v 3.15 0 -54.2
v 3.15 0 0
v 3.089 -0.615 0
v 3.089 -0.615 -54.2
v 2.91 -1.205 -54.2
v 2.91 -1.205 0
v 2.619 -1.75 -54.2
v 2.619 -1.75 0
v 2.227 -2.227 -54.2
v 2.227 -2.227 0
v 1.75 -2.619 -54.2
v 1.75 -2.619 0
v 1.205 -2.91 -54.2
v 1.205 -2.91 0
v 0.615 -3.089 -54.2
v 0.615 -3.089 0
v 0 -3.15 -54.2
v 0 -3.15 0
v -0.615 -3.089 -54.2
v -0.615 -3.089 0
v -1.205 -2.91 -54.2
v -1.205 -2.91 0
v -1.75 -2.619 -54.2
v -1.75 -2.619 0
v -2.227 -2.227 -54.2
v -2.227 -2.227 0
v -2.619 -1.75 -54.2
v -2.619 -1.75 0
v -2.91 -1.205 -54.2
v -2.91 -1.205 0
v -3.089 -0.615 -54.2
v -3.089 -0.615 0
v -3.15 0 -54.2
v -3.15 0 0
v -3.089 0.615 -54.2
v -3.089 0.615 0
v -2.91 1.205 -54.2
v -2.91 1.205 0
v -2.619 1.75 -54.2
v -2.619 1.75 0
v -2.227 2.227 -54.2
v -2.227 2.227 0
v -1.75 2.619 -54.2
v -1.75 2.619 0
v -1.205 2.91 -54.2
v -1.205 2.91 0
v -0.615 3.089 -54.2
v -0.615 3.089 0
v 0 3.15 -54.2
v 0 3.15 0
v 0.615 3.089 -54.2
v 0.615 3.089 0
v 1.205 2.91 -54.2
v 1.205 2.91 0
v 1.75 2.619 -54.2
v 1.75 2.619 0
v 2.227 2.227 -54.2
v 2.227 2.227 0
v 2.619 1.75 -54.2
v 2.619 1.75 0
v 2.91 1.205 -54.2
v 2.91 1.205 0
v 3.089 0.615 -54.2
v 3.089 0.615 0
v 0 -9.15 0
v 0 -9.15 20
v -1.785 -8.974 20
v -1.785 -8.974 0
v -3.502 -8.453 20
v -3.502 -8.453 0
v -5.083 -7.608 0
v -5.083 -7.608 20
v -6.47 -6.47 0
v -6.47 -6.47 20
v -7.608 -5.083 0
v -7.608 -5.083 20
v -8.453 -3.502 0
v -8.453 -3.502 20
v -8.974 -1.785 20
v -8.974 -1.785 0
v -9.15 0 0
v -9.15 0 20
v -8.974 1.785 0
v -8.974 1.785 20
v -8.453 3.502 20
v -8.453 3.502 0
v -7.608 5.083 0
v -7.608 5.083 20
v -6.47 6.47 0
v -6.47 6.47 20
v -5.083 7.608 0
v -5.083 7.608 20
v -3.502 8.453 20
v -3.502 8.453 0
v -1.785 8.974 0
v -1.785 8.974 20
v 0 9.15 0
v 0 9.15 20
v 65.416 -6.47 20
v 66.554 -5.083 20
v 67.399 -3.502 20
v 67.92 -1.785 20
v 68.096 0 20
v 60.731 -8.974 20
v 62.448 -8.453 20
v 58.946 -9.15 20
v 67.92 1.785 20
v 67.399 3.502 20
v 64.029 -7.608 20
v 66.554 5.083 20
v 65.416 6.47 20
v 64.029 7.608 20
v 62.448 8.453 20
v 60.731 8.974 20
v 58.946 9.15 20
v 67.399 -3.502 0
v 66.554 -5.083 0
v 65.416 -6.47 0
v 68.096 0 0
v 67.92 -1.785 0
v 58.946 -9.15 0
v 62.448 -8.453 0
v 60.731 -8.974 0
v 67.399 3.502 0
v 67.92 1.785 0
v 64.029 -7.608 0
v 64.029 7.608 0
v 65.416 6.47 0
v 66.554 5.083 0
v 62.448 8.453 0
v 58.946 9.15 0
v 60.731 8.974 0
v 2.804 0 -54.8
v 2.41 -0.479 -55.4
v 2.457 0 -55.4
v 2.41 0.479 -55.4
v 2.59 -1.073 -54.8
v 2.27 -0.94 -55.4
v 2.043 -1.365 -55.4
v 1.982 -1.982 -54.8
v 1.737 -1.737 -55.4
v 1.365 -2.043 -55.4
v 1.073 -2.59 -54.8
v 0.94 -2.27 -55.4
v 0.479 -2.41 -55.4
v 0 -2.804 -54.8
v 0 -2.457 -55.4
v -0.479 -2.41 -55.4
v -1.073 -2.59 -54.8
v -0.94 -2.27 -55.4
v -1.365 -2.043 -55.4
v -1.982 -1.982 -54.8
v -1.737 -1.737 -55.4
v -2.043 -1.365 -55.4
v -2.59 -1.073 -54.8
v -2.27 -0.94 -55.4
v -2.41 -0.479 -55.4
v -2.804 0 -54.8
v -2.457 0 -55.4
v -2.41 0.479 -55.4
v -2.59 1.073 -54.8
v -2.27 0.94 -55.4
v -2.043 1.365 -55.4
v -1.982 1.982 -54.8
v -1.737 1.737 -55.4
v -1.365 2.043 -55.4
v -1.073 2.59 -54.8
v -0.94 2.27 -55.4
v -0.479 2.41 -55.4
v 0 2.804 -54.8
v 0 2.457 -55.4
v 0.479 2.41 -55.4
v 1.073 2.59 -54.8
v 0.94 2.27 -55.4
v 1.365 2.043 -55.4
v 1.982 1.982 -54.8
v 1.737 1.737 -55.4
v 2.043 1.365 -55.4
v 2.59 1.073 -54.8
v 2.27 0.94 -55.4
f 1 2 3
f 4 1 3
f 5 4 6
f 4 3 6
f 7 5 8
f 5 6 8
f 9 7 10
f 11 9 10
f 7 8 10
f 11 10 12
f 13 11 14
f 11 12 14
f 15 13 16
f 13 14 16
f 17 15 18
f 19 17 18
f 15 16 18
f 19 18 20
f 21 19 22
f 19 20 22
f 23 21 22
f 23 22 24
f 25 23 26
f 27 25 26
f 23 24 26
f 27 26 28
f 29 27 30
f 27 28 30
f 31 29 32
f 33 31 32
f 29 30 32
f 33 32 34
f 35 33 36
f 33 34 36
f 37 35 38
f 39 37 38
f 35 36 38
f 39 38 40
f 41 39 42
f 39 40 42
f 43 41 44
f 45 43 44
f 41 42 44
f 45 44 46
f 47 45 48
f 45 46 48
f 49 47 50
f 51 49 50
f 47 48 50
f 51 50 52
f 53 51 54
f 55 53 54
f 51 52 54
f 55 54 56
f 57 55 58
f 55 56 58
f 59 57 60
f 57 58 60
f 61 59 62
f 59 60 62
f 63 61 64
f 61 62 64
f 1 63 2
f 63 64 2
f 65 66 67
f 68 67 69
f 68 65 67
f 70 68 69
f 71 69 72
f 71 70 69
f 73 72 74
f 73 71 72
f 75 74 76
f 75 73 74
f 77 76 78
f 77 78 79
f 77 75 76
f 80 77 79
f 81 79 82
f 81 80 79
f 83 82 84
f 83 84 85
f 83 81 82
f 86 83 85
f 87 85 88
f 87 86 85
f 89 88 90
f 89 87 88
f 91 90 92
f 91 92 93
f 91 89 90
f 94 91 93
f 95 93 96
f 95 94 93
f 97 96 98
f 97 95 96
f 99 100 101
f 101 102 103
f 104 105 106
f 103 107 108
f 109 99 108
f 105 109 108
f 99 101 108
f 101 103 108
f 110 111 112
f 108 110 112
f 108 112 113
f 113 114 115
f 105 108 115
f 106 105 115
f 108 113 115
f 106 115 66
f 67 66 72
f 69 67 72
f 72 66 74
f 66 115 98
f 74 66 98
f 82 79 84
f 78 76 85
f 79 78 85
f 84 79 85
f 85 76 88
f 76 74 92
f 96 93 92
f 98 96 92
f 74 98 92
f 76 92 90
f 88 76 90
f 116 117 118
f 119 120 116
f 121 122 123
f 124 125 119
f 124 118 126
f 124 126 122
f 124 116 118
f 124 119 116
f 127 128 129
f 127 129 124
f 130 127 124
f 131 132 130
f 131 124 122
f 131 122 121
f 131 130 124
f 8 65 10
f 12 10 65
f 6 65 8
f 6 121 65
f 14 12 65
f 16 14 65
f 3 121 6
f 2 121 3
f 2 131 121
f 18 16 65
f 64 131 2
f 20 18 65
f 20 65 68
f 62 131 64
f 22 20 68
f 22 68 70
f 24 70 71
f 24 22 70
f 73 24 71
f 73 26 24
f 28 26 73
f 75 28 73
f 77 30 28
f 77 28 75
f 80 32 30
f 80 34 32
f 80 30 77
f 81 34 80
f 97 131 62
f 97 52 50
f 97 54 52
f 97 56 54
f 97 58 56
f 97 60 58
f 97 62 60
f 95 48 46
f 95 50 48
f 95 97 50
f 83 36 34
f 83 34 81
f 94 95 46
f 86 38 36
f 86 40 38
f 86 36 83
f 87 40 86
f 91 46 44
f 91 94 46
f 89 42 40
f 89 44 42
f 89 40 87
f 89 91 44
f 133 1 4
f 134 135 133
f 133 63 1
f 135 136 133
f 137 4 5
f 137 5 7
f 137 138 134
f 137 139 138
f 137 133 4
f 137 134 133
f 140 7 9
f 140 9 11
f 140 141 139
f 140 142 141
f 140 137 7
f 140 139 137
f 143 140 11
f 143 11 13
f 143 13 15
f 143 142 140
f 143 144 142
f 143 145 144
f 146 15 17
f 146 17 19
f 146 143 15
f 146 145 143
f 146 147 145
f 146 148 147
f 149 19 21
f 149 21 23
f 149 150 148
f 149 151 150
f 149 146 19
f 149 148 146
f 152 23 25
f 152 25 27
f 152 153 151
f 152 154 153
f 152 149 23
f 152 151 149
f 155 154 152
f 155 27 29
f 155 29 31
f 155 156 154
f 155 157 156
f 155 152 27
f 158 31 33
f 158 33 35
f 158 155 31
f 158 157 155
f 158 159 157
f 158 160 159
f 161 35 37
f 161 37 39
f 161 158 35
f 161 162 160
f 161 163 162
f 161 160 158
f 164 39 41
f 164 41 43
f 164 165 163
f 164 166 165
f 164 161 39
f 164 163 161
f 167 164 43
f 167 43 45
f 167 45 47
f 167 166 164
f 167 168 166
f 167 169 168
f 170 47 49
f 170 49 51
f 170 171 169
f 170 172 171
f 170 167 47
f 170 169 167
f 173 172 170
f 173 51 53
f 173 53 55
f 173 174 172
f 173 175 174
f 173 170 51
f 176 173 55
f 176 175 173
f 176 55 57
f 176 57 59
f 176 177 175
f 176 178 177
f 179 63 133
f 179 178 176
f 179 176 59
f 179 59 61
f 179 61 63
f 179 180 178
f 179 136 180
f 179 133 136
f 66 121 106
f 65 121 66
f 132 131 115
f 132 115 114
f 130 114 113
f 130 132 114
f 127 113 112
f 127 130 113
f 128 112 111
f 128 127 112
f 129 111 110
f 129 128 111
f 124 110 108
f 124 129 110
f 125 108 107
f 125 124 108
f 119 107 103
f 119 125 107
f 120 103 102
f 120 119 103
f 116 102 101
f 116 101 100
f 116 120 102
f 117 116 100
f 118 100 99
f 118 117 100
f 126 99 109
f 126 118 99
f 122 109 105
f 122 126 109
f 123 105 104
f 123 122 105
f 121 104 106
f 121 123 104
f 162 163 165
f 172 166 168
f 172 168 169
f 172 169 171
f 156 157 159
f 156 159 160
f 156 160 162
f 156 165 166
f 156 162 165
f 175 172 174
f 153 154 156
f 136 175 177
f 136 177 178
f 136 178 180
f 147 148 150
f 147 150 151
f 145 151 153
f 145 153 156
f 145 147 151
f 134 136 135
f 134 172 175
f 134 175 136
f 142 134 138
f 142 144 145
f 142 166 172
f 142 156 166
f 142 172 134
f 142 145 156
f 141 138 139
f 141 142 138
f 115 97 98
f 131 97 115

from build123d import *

# Parameters (mm, degrees)
SALIENTE_EXTRUIR1_DEPTH = 20
SALIENTE_EXTRUIR2_DEPTH = 20
CROQUIS3_R              = 3.15
SALIENTE_EXTRUIR3_DEPTH = 55.4
CHAFL_N1_SIZE           = 1.2
CHAFL_N1_SIZE2          = 0.692820323


with BuildPart() as part:
    # Croquis1 → Saliente-Extruir1 (new body)
    with BuildSketch(Plane.XY):
        with BuildLine():
            Line((63.919718915, 2.991646678), (0.57794053, 7.728420585))
            ThreePointArc((0.57794053, 7.728420585), (-7.75, 0), (0.57794053, -7.728420585))
            Line((0.57794053, -7.728420585), (63.919718915, -2.991646678))
            ThreePointArc((63.919718915, -2.991646678), (66.696, 0), (63.919718915, 2.991646678))
        make_face()
    extrude(amount=SALIENTE_EXTRUIR1_DEPTH)

    # Croquis2 → Saliente-Extruir2 (add)
    with BuildSketch(Plane.XY):
        with BuildLine():
            Line((0, 9.15), (58.946, 9.15))
            ThreePointArc((58.946, 9.15), (68.096, 0), (58.946, -9.15))
            Line((58.946, -9.15), (0, -9.15))
            ThreePointArc((0, -9.15), (-9.15, 0), (0, 9.15))
        make_face()
    extrude(amount=SALIENTE_EXTRUIR2_DEPTH)

    # Croquis3 → Saliente-Extruir3 (add)
    with BuildSketch(Plane(origin=(0, 0, 0), x_dir=(-1, 0, 0), z_dir=(0, 0, -1))):
        Circle(CROQUIS3_R)
    extrude(amount=SALIENTE_EXTRUIR3_DEPTH)

    # Chaflán1
    chafl_n1_edges = [part.edges().sort_by_distance(p)[0] for p in [
        (3.15, 0, -55.4),
    ]]
    chafl_n1_side = [part.faces().sort_by_distance(p)[0] for p in [
        (3.15, 0, -27.7),
    ]]
    chamfer(chafl_n1_edges, length=CHAFL_N1_SIZE, length2=CHAFL_N1_SIZE2, reference=chafl_n1_side[0])


solid = part.part
